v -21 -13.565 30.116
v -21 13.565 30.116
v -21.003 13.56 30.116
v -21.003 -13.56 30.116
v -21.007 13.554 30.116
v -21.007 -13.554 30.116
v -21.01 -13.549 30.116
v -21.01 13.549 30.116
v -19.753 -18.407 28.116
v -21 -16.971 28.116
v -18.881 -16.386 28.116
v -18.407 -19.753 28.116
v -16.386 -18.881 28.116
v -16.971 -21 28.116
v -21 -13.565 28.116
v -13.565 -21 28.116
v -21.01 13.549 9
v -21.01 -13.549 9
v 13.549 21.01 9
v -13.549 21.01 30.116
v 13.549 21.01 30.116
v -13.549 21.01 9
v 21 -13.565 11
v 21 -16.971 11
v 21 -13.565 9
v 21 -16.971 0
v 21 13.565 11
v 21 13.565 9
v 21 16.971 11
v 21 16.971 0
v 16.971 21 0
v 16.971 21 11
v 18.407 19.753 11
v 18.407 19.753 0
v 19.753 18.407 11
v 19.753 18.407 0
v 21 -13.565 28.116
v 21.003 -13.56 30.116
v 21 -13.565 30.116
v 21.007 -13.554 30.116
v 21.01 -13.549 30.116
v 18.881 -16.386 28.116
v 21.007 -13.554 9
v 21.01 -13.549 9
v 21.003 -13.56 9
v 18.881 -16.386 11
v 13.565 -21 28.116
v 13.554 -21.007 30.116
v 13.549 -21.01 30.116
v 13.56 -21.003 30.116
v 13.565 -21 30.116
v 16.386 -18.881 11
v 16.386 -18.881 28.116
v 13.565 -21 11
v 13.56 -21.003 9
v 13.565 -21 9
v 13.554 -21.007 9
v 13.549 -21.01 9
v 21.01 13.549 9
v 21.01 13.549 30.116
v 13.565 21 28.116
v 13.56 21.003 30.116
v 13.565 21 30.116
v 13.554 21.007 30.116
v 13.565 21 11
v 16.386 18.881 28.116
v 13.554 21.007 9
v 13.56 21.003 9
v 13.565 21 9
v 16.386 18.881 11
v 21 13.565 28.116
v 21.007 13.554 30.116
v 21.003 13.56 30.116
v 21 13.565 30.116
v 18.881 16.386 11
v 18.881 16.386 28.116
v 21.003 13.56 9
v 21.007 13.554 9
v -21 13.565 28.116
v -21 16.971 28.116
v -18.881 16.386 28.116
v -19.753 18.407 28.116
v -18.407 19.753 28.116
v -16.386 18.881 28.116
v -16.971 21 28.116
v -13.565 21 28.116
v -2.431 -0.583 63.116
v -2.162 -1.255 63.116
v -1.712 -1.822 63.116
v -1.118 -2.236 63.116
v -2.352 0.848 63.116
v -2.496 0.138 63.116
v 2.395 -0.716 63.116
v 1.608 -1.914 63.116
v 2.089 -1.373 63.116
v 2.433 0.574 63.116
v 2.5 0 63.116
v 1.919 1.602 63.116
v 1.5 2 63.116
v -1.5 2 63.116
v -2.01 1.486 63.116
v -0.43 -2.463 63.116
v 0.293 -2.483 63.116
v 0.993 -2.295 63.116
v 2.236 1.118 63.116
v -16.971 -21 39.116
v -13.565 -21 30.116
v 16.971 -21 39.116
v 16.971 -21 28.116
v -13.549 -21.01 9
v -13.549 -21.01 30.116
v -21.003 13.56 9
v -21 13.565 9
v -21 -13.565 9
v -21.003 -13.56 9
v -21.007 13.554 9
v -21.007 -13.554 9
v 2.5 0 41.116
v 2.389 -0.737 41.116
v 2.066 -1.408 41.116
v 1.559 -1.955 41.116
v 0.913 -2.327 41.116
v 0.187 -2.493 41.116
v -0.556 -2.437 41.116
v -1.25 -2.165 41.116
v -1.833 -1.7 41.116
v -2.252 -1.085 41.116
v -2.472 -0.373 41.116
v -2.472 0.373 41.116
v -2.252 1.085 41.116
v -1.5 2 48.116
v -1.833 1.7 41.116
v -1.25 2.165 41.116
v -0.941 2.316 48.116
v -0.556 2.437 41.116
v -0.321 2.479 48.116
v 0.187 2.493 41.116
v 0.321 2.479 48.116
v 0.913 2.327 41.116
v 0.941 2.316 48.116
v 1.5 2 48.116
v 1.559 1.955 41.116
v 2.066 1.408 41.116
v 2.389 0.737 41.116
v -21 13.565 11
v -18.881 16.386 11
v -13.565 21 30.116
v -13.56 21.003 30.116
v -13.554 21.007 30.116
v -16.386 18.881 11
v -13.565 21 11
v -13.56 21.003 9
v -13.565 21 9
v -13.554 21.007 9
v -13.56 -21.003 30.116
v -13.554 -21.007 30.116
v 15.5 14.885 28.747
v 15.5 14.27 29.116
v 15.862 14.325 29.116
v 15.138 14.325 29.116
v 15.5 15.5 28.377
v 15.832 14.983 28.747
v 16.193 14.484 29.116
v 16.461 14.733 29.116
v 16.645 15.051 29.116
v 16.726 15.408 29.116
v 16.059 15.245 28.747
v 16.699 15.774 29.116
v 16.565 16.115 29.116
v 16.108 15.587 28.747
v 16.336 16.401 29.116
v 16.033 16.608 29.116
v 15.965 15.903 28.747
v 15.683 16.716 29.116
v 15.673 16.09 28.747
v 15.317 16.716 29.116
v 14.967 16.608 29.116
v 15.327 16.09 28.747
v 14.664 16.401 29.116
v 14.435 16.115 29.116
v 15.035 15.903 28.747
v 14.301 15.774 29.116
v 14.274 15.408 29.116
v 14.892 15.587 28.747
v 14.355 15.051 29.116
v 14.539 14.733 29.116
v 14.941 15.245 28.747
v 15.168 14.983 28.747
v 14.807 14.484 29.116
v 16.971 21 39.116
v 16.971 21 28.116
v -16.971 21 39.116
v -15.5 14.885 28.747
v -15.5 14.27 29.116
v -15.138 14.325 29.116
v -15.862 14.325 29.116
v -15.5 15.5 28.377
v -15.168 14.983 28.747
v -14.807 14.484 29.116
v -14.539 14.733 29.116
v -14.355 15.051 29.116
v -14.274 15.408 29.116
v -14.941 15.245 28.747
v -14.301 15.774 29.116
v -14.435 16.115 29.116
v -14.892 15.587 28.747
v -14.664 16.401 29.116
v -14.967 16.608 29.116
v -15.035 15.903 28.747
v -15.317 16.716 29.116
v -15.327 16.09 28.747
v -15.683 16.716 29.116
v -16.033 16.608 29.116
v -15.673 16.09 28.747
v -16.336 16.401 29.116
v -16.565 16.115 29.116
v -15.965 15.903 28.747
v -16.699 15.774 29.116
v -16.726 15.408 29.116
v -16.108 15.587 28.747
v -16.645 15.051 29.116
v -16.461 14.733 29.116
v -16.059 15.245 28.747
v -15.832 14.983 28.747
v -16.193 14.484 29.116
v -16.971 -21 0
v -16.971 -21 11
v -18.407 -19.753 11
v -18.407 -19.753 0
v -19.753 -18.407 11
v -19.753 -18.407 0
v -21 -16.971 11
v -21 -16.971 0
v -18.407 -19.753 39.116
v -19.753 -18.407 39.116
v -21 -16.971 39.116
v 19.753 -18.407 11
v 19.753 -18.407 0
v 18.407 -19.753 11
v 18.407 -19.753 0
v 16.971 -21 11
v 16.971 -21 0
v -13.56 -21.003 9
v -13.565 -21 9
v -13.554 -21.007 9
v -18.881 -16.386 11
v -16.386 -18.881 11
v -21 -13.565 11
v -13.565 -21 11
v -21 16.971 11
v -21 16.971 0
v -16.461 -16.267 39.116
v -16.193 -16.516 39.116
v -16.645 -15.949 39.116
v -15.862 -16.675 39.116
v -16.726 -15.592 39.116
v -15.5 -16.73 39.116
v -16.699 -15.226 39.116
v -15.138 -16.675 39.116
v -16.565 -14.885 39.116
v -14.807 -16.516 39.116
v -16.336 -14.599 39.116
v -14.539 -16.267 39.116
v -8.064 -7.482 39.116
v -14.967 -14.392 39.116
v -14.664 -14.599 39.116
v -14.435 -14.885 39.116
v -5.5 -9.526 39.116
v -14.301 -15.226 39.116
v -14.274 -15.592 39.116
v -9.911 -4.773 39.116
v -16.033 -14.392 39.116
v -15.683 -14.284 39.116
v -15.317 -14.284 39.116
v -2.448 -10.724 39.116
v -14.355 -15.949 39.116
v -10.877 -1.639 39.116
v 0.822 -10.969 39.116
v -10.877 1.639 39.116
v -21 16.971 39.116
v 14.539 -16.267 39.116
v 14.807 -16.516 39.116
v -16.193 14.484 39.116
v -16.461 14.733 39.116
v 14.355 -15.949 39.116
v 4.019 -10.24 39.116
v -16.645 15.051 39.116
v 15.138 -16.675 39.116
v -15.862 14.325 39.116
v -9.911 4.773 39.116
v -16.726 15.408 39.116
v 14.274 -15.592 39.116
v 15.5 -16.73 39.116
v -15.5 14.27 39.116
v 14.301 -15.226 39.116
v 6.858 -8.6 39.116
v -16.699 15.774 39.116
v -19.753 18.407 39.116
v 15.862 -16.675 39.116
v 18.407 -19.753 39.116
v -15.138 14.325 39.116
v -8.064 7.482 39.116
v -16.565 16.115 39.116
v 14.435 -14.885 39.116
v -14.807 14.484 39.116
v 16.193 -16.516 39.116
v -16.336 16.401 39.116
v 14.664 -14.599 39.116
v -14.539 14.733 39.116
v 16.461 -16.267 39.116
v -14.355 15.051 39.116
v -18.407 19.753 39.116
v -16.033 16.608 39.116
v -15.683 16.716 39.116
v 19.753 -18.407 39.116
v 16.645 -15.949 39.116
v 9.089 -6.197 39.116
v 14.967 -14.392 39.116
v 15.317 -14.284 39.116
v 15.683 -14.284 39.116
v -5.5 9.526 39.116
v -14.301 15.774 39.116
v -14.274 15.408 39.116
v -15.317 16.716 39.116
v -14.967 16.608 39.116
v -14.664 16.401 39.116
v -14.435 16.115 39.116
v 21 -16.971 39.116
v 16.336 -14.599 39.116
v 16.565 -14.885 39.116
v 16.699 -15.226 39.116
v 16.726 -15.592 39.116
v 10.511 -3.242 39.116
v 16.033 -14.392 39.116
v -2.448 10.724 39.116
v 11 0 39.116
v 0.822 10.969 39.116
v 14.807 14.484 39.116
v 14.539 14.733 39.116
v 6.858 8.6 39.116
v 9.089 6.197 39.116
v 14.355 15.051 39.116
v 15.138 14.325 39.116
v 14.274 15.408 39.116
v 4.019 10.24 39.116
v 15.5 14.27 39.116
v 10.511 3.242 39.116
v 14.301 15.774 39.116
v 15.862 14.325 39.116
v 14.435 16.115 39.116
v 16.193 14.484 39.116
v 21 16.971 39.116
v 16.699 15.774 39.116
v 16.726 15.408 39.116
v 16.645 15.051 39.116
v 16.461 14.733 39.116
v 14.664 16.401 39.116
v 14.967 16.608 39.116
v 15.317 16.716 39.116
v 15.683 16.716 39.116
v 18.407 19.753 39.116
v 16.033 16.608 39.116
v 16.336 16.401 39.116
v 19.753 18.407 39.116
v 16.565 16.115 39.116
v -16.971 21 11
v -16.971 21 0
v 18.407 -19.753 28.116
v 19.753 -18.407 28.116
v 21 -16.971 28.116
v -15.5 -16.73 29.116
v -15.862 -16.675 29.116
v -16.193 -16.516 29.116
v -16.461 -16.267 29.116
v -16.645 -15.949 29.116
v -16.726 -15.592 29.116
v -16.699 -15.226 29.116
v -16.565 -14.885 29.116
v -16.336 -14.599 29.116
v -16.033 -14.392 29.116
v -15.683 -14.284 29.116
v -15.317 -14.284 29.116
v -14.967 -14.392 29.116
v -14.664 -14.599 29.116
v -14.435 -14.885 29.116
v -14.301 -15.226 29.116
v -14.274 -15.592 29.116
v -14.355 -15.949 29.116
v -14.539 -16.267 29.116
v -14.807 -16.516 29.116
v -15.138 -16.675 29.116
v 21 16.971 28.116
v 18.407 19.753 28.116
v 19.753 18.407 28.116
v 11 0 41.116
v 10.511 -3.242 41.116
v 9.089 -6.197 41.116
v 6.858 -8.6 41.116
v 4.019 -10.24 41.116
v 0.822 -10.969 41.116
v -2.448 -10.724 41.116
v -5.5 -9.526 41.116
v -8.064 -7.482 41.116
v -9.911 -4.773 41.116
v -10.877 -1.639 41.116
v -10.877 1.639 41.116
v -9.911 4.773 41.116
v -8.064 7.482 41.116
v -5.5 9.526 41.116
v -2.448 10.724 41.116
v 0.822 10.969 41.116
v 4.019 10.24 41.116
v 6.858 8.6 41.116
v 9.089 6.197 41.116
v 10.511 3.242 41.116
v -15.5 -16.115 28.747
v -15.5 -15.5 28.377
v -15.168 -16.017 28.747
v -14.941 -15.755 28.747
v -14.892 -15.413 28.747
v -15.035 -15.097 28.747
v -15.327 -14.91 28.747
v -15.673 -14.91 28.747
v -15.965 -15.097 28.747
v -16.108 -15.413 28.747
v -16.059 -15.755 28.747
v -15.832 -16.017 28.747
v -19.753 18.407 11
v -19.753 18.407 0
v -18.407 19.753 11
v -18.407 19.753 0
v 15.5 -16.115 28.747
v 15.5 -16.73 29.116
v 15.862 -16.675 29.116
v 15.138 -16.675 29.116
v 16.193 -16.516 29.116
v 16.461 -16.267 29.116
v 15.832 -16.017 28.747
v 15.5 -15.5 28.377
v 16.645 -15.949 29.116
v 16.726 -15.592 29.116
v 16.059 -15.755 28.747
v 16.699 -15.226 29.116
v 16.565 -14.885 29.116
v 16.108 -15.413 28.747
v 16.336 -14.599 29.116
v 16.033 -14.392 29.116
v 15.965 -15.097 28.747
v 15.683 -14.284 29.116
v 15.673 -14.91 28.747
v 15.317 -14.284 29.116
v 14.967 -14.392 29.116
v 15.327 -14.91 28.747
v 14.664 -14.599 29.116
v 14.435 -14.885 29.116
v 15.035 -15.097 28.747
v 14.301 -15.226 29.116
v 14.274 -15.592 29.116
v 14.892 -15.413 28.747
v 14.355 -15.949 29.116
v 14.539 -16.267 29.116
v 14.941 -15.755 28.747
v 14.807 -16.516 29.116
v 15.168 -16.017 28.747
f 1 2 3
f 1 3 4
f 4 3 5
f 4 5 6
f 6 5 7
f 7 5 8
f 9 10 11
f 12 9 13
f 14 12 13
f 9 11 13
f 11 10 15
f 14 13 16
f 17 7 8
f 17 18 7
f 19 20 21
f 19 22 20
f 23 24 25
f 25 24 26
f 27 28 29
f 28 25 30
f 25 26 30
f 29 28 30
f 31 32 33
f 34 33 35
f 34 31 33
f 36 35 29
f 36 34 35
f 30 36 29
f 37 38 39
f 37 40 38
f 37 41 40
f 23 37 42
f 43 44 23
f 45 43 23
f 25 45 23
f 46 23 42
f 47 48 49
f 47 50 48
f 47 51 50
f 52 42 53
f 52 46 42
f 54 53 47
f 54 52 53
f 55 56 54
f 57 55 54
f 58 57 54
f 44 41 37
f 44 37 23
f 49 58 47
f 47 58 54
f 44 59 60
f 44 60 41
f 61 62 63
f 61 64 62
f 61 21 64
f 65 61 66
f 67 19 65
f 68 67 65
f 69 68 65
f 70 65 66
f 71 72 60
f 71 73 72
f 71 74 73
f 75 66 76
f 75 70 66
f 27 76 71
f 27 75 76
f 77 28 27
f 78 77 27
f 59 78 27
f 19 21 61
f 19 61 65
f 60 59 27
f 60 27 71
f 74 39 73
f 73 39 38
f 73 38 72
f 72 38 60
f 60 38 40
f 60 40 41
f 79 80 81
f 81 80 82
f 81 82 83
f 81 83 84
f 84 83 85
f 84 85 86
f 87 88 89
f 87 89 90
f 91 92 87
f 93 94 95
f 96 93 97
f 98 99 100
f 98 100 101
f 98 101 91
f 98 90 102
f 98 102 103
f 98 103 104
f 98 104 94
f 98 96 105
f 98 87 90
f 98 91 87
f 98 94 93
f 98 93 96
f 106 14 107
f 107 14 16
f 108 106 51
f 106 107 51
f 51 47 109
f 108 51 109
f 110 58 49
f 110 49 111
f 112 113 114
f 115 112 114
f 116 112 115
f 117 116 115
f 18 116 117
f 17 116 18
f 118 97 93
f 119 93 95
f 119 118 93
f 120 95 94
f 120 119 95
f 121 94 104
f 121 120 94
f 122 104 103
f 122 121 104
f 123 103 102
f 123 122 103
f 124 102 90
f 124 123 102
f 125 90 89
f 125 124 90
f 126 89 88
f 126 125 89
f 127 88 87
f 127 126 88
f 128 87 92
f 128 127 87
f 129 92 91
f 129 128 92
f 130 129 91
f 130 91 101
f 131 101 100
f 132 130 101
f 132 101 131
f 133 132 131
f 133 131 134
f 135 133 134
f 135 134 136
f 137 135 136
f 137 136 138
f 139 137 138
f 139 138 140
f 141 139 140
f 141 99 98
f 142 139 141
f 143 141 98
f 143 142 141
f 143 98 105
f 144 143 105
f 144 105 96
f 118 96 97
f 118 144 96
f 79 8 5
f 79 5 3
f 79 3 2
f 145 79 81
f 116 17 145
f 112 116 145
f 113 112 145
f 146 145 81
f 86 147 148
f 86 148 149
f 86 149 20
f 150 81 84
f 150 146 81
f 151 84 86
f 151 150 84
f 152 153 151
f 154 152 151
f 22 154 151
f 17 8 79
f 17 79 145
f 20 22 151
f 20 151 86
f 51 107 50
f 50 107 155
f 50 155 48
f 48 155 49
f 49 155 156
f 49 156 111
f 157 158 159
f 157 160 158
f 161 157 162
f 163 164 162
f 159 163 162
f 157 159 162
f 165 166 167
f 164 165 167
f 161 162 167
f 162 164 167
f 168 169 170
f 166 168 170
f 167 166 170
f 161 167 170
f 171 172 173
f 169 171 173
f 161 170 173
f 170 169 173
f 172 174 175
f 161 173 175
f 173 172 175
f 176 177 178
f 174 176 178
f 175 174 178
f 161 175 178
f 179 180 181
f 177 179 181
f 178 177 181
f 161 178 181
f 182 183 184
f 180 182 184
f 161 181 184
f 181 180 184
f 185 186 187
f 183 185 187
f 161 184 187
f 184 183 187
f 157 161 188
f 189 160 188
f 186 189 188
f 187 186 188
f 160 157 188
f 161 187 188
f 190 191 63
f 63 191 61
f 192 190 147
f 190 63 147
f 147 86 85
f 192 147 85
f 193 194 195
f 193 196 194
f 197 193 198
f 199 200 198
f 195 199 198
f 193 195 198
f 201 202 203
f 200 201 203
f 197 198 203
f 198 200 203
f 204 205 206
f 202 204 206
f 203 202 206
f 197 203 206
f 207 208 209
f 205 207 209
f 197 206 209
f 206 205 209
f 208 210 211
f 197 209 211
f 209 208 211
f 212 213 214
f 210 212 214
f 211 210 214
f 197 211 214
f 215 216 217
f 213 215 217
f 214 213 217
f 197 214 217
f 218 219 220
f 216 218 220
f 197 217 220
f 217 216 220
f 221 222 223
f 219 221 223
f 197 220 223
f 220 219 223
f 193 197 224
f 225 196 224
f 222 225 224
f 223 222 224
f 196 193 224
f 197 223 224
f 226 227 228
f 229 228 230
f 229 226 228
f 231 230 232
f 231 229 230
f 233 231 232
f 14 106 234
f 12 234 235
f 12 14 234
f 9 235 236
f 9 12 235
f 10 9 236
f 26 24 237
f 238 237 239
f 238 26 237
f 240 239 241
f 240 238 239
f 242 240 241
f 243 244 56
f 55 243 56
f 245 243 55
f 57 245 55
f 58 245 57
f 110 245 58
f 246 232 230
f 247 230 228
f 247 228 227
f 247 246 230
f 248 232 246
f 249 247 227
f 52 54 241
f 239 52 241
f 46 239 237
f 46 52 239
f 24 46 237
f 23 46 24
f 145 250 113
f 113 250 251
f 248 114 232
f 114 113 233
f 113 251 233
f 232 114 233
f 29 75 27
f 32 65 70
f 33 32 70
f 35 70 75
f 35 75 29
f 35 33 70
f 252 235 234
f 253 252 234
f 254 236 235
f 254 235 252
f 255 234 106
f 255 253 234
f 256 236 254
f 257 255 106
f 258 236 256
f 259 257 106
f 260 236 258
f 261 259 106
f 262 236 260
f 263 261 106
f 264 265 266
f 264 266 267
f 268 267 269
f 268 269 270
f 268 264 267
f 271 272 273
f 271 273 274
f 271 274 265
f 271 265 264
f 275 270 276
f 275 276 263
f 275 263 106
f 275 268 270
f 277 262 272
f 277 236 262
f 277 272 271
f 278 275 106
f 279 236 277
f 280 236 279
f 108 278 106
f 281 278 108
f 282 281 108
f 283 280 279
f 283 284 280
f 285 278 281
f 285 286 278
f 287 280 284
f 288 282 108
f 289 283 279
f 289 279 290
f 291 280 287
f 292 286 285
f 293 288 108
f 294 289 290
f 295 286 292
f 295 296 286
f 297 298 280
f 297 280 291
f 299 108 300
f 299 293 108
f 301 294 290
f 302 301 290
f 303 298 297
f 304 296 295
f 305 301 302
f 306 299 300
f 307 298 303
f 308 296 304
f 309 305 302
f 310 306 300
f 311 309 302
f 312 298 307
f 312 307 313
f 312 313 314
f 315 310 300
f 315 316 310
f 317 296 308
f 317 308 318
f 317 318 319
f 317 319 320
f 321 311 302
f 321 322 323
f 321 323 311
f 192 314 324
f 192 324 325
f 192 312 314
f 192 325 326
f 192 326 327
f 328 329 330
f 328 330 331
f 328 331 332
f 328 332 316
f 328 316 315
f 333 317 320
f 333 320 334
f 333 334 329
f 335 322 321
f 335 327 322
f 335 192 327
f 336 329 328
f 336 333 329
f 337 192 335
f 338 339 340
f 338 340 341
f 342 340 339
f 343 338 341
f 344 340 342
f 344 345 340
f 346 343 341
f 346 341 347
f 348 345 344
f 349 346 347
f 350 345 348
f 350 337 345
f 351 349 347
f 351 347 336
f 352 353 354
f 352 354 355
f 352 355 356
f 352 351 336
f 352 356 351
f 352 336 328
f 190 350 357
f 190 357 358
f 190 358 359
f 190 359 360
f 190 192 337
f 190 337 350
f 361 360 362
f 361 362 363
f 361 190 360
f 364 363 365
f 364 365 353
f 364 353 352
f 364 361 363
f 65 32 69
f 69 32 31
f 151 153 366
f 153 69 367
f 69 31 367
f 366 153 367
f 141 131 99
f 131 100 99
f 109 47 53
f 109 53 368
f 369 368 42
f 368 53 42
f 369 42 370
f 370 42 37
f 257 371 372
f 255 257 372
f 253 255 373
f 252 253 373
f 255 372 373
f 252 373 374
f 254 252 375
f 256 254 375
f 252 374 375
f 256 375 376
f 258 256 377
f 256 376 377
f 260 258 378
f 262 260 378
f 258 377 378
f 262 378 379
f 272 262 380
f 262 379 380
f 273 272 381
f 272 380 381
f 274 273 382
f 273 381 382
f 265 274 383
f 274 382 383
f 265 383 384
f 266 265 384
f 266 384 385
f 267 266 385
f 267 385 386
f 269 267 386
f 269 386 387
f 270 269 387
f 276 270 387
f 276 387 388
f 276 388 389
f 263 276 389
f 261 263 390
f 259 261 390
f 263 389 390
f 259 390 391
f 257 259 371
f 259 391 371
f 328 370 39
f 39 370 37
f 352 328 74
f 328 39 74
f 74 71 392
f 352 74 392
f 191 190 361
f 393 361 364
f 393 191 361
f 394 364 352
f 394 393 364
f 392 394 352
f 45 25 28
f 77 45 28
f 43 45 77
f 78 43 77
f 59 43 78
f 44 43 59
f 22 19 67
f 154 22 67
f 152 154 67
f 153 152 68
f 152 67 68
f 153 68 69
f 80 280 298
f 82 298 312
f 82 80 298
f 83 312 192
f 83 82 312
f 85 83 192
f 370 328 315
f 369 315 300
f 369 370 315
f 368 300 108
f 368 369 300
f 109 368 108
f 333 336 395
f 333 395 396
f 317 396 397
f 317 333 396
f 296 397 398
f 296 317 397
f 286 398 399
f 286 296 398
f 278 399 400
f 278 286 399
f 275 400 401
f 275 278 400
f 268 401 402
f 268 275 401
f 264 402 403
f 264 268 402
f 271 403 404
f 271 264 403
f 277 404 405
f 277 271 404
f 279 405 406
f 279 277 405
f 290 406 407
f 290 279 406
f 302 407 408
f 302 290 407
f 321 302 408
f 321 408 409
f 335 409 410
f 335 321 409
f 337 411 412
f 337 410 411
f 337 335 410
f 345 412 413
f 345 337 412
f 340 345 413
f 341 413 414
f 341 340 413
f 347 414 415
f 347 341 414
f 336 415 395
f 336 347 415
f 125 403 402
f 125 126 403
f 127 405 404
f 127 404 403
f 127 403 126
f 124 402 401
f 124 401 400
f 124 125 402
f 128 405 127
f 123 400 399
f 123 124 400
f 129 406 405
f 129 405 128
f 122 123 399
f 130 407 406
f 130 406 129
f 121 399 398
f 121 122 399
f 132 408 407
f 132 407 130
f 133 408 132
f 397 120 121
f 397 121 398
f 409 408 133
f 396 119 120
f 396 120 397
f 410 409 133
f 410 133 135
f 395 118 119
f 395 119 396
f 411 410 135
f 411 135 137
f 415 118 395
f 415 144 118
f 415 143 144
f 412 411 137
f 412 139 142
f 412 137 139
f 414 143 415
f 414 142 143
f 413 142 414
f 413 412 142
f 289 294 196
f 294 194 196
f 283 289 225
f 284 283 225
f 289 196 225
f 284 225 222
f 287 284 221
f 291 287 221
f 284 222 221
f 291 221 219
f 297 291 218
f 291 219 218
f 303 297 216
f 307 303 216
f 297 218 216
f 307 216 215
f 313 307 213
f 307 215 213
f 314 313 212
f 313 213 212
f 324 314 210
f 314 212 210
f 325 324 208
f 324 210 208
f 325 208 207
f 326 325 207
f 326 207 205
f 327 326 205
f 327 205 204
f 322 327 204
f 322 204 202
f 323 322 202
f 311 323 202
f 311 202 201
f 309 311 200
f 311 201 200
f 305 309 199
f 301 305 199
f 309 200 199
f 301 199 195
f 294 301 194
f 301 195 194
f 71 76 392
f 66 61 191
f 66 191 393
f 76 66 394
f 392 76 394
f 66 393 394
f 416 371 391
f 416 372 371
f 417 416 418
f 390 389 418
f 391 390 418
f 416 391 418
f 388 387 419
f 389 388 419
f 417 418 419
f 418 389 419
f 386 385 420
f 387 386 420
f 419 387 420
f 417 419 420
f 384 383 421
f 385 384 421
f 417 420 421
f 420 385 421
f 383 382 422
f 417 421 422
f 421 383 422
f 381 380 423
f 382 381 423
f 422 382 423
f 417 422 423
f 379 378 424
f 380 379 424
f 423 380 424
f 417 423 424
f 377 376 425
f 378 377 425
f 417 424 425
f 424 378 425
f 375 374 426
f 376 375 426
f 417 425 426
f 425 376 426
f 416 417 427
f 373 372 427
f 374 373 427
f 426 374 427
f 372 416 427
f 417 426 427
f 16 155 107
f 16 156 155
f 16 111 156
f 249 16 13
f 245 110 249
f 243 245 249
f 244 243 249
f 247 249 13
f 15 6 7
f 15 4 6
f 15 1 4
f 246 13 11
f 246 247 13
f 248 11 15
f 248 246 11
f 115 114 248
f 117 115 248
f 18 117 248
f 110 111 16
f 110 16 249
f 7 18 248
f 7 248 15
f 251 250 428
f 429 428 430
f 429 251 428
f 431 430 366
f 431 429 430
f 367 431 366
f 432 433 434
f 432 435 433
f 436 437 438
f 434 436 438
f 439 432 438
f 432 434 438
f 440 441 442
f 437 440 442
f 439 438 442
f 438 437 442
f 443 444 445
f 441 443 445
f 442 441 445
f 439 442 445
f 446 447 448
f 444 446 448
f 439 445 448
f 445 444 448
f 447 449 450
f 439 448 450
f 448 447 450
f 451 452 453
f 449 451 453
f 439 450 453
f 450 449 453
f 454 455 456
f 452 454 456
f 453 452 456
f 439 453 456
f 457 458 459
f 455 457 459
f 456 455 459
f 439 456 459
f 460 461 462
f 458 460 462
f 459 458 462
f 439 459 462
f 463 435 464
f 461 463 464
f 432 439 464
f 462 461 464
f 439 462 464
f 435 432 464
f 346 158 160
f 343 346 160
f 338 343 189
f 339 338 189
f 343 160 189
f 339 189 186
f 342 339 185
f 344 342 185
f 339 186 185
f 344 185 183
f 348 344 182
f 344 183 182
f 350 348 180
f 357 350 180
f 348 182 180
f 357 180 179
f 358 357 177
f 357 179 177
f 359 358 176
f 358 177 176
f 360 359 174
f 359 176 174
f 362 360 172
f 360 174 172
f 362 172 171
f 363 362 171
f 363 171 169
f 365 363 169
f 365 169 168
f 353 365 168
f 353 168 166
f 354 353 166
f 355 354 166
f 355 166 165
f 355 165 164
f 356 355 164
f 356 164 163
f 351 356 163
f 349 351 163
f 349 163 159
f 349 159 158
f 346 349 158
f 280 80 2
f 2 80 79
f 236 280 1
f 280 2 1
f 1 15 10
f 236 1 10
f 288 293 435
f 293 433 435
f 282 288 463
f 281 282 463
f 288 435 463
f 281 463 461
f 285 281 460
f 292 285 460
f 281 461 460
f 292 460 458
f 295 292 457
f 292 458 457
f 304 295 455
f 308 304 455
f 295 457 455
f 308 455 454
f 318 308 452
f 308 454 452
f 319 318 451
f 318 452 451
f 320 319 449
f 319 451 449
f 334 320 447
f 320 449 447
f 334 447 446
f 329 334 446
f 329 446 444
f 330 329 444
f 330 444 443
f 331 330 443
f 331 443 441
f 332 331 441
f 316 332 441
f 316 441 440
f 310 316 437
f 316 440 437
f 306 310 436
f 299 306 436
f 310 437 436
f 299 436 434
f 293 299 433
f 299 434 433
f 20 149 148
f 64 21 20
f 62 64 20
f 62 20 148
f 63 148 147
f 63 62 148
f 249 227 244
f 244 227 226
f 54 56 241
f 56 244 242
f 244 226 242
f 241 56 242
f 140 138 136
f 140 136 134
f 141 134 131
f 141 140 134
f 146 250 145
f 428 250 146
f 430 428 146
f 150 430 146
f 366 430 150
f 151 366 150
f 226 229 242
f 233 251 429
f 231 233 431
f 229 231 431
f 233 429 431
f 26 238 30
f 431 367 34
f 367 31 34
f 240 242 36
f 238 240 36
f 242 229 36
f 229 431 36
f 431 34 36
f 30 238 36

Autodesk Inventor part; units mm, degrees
ref_plane "YZ Plane" through (0, 0, 0) normal (1, 0, 0) x (0, 1, 0)
ref_plane "XZ Plane" through (0, 0, 0) normal (0, 1, 0) x (-1, 0, 0)
ref_plane "XY Plane" through (0, 0, 0) normal (0, 0, 1) x (1, 0, 0)
sketch "Sketch1" plane through (0, 0, 0) normal (0, 0, 1) x (1, 0, 0)
  line L0 (-21, 21) -> (21, 21) construction
  line L1 (21, 21) -> (21, -21) construction
  line L2 (21, -21) -> (-21, -21) construction
  line L3 (-21, -21) -> (-21, 21) construction
  line L4 (-21, 16.9706) -> (-21, -16.9706)
  line L5 (-16.9706, -21) -> (16.9706, -21)
  line L6 (21, -16.9706) -> (21, 16.9706)
  line L7 (16.9706, 21) -> (-16.9706, 21)
  arc A0 (-16.9706, 21) -> (-21, 16.9706) centre (0, 0) ccw
  arc A1 (-21, -16.9706) -> (-16.9706, -21) centre (0, 0) ccw
  arc A2 (16.9706, -21) -> (21, -16.9706) centre (0, 0) ccw
  arc A3 (21, 16.9706) -> (16.9706, 21) centre (0, 0) ccw
  dimension "d0" = 42
  dimension "d3" = 27
extrude "Extrusion1" add sketch "Sketch1" along normal blind 11
sketch "Sketch2" plane through (0, 0, 11) normal (0, 0, 1) x (1, 0, 0)
  line L0 (-21, 16.9706) -> (-21, -16.9706) projected
  arc A0 (-21, -16.9706) -> (-16.9706, -21) centre (0, 0) ccw projected
  line L1 (-16.9706, -21) -> (16.9706, -21) projected
  arc A1 (16.9706, -21) -> (21, -16.9706) centre (0, 0) ccw projected
  line L2 (21, -16.9706) -> (21, 16.9706) projected
  arc A2 (21, 16.9706) -> (16.9706, 21) centre (0, 0) ccw projected
  line L3 (16.9706, 21) -> (-16.9706, 21) projected
  arc A3 (-16.9706, 21) -> (-21, 16.9706) centre (0, 0) ccw projected
  line L4 (-16.9741, 21.01) -> (16.9741, 21.01)
  arc A4 (21.01, 16.9741) -> (16.9741, 21.01) centre (0, 0) ccw
  line L5 (21.01, 16.9741) -> (21.01, -16.9741)
  arc A5 (16.9741, -21.01) -> (21.01, -16.9741) centre (0, 0) ccw
  line L6 (16.9741, -21.01) -> (-16.9741, -21.01)
  arc A6 (-21.01, -16.9741) -> (-16.9741, -21.01) centre (0, 0) ccw
  line L7 (-21.01, -16.9741) -> (-21.01, 16.9741)
  arc A7 (-16.9741, 21.01) -> (-21.01, 16.9741) centre (0, 0) ccw
  arc A8 (-13.5492, 21.01) -> (-21.01, 13.5492) centre (0, 0) ccw
  arc A9 (-21.01, -13.5492) -> (-13.5492, -21.01) centre (0, 0) ccw
  arc A10 (13.5492, -21.01) -> (21.01, -13.5492) centre (0, 0) ccw
  arc A11 (21.01, 13.5492) -> (13.5492, 21.01) centre (0, 0) ccw
  dimension "d6" = 25
  dimension "d8" = 0.01
extrude "Extrusion2" add sketch "Sketch2" along normal blind 19.116 and the other way blind 2 contours A8 L3 A11 L2 A10 L1 A9 L0 | L0 A9 L7 A8 | A8 L4 A11 L3 | L1 A10 L6 A9 | A11 L5 A10 L2
sketch "Sketch3" plane through (0, 0, 30.116) normal (0, 0, 1) x (1, 0, 0)
  line L0 (-21, 16.9706) -> (-21, -16.9706) projected
  arc A0 (-16.9706, 21) -> (-21, 16.9706) centre (0, 0) ccw projected
  line L1 (16.9706, 21) -> (-16.9706, 21) projected
  arc A1 (21, 16.9706) -> (16.9706, 21) centre (0, 0) ccw projected
  line L2 (21, -16.9706) -> (21, 16.9706) projected
  arc A2 (16.9706, -21) -> (21, -16.9706) centre (0, 0) ccw projected
  line L3 (-16.9706, -21) -> (16.9706, -21) projected
  arc A3 (-21, -16.9706) -> (-16.9706, -21) centre (0, 0) ccw projected
extrude "Extrusion3" add sketch "Sketch3" along normal blind 9 and the other way blind 2
sketch "Sketch4" plane through (0, 0, 39.116) normal (0, 0, 1) x (1, 0, 0)
  arc A0 (-16.9706, 21) -> (-21, 16.9706) centre (0, 0) ccw projected
  circle A1 centre (0, 0) radius 11
  dimension "d17" = 22
extrude "Extrusion4" add sketch "Sketch4" along normal blind 2
sketch "Sketch5" plane through (0, 0, 41.116) normal (0, 0, 1) x (1, 0, 0)
  circle A0 centre (0, 0) radius 11 projected
  circle A1 centre (0, 0) radius 2.5
  dimension "d21" = 5
extrude "Extrusion5" add sketch "Sketch5" along normal blind 22 contours A1
sketch "Sketch6" plane through (0, 0, 63.116) normal (0, 0, 1) x (1, 0, 0)
  circle A0 centre (0, 0) radius 2.5 projected
  line L0 (-1.5, 2) -> (1.5, 2)
  dimension "d25" = 2
extrude "Extrusion6" cut sketch "Sketch6" against normal blind 15 contours L0 A0 picked at (-0.3466, 2.0912)
sketch "Sketch7" plane through (0, 0, 39.116) normal (0, 0, 1) x (1, 0, 0)
  arc A0 (-16.9706, 21) -> (-21, 16.9706) centre (0, 0) ccw projected
  line L0 (-15.5, 15.5) -> (15.5, 15.5)
  line L1 (15.5, 15.5) -> (15.5, -15.5)
  line L2 (15.5, -15.5) -> (-15.5, -15.5)
  line L3 (-15.5, -15.5) -> (-15.5, 15.5)
  dimension "d28" = 31
hole "Hole1" at (15.5, 15.5, 39.116) at (15.5, -15.5, 39.116) at (-15.5, -15.5, 39.116) at (-15.5, 15.5, 39.116) direction (0, 0, -1) diameter 2.459 depth 10 tip angle 118 thread size "M3x0.5" class "6H" standard "ISO Metric profile"
properties part number "stepper"
